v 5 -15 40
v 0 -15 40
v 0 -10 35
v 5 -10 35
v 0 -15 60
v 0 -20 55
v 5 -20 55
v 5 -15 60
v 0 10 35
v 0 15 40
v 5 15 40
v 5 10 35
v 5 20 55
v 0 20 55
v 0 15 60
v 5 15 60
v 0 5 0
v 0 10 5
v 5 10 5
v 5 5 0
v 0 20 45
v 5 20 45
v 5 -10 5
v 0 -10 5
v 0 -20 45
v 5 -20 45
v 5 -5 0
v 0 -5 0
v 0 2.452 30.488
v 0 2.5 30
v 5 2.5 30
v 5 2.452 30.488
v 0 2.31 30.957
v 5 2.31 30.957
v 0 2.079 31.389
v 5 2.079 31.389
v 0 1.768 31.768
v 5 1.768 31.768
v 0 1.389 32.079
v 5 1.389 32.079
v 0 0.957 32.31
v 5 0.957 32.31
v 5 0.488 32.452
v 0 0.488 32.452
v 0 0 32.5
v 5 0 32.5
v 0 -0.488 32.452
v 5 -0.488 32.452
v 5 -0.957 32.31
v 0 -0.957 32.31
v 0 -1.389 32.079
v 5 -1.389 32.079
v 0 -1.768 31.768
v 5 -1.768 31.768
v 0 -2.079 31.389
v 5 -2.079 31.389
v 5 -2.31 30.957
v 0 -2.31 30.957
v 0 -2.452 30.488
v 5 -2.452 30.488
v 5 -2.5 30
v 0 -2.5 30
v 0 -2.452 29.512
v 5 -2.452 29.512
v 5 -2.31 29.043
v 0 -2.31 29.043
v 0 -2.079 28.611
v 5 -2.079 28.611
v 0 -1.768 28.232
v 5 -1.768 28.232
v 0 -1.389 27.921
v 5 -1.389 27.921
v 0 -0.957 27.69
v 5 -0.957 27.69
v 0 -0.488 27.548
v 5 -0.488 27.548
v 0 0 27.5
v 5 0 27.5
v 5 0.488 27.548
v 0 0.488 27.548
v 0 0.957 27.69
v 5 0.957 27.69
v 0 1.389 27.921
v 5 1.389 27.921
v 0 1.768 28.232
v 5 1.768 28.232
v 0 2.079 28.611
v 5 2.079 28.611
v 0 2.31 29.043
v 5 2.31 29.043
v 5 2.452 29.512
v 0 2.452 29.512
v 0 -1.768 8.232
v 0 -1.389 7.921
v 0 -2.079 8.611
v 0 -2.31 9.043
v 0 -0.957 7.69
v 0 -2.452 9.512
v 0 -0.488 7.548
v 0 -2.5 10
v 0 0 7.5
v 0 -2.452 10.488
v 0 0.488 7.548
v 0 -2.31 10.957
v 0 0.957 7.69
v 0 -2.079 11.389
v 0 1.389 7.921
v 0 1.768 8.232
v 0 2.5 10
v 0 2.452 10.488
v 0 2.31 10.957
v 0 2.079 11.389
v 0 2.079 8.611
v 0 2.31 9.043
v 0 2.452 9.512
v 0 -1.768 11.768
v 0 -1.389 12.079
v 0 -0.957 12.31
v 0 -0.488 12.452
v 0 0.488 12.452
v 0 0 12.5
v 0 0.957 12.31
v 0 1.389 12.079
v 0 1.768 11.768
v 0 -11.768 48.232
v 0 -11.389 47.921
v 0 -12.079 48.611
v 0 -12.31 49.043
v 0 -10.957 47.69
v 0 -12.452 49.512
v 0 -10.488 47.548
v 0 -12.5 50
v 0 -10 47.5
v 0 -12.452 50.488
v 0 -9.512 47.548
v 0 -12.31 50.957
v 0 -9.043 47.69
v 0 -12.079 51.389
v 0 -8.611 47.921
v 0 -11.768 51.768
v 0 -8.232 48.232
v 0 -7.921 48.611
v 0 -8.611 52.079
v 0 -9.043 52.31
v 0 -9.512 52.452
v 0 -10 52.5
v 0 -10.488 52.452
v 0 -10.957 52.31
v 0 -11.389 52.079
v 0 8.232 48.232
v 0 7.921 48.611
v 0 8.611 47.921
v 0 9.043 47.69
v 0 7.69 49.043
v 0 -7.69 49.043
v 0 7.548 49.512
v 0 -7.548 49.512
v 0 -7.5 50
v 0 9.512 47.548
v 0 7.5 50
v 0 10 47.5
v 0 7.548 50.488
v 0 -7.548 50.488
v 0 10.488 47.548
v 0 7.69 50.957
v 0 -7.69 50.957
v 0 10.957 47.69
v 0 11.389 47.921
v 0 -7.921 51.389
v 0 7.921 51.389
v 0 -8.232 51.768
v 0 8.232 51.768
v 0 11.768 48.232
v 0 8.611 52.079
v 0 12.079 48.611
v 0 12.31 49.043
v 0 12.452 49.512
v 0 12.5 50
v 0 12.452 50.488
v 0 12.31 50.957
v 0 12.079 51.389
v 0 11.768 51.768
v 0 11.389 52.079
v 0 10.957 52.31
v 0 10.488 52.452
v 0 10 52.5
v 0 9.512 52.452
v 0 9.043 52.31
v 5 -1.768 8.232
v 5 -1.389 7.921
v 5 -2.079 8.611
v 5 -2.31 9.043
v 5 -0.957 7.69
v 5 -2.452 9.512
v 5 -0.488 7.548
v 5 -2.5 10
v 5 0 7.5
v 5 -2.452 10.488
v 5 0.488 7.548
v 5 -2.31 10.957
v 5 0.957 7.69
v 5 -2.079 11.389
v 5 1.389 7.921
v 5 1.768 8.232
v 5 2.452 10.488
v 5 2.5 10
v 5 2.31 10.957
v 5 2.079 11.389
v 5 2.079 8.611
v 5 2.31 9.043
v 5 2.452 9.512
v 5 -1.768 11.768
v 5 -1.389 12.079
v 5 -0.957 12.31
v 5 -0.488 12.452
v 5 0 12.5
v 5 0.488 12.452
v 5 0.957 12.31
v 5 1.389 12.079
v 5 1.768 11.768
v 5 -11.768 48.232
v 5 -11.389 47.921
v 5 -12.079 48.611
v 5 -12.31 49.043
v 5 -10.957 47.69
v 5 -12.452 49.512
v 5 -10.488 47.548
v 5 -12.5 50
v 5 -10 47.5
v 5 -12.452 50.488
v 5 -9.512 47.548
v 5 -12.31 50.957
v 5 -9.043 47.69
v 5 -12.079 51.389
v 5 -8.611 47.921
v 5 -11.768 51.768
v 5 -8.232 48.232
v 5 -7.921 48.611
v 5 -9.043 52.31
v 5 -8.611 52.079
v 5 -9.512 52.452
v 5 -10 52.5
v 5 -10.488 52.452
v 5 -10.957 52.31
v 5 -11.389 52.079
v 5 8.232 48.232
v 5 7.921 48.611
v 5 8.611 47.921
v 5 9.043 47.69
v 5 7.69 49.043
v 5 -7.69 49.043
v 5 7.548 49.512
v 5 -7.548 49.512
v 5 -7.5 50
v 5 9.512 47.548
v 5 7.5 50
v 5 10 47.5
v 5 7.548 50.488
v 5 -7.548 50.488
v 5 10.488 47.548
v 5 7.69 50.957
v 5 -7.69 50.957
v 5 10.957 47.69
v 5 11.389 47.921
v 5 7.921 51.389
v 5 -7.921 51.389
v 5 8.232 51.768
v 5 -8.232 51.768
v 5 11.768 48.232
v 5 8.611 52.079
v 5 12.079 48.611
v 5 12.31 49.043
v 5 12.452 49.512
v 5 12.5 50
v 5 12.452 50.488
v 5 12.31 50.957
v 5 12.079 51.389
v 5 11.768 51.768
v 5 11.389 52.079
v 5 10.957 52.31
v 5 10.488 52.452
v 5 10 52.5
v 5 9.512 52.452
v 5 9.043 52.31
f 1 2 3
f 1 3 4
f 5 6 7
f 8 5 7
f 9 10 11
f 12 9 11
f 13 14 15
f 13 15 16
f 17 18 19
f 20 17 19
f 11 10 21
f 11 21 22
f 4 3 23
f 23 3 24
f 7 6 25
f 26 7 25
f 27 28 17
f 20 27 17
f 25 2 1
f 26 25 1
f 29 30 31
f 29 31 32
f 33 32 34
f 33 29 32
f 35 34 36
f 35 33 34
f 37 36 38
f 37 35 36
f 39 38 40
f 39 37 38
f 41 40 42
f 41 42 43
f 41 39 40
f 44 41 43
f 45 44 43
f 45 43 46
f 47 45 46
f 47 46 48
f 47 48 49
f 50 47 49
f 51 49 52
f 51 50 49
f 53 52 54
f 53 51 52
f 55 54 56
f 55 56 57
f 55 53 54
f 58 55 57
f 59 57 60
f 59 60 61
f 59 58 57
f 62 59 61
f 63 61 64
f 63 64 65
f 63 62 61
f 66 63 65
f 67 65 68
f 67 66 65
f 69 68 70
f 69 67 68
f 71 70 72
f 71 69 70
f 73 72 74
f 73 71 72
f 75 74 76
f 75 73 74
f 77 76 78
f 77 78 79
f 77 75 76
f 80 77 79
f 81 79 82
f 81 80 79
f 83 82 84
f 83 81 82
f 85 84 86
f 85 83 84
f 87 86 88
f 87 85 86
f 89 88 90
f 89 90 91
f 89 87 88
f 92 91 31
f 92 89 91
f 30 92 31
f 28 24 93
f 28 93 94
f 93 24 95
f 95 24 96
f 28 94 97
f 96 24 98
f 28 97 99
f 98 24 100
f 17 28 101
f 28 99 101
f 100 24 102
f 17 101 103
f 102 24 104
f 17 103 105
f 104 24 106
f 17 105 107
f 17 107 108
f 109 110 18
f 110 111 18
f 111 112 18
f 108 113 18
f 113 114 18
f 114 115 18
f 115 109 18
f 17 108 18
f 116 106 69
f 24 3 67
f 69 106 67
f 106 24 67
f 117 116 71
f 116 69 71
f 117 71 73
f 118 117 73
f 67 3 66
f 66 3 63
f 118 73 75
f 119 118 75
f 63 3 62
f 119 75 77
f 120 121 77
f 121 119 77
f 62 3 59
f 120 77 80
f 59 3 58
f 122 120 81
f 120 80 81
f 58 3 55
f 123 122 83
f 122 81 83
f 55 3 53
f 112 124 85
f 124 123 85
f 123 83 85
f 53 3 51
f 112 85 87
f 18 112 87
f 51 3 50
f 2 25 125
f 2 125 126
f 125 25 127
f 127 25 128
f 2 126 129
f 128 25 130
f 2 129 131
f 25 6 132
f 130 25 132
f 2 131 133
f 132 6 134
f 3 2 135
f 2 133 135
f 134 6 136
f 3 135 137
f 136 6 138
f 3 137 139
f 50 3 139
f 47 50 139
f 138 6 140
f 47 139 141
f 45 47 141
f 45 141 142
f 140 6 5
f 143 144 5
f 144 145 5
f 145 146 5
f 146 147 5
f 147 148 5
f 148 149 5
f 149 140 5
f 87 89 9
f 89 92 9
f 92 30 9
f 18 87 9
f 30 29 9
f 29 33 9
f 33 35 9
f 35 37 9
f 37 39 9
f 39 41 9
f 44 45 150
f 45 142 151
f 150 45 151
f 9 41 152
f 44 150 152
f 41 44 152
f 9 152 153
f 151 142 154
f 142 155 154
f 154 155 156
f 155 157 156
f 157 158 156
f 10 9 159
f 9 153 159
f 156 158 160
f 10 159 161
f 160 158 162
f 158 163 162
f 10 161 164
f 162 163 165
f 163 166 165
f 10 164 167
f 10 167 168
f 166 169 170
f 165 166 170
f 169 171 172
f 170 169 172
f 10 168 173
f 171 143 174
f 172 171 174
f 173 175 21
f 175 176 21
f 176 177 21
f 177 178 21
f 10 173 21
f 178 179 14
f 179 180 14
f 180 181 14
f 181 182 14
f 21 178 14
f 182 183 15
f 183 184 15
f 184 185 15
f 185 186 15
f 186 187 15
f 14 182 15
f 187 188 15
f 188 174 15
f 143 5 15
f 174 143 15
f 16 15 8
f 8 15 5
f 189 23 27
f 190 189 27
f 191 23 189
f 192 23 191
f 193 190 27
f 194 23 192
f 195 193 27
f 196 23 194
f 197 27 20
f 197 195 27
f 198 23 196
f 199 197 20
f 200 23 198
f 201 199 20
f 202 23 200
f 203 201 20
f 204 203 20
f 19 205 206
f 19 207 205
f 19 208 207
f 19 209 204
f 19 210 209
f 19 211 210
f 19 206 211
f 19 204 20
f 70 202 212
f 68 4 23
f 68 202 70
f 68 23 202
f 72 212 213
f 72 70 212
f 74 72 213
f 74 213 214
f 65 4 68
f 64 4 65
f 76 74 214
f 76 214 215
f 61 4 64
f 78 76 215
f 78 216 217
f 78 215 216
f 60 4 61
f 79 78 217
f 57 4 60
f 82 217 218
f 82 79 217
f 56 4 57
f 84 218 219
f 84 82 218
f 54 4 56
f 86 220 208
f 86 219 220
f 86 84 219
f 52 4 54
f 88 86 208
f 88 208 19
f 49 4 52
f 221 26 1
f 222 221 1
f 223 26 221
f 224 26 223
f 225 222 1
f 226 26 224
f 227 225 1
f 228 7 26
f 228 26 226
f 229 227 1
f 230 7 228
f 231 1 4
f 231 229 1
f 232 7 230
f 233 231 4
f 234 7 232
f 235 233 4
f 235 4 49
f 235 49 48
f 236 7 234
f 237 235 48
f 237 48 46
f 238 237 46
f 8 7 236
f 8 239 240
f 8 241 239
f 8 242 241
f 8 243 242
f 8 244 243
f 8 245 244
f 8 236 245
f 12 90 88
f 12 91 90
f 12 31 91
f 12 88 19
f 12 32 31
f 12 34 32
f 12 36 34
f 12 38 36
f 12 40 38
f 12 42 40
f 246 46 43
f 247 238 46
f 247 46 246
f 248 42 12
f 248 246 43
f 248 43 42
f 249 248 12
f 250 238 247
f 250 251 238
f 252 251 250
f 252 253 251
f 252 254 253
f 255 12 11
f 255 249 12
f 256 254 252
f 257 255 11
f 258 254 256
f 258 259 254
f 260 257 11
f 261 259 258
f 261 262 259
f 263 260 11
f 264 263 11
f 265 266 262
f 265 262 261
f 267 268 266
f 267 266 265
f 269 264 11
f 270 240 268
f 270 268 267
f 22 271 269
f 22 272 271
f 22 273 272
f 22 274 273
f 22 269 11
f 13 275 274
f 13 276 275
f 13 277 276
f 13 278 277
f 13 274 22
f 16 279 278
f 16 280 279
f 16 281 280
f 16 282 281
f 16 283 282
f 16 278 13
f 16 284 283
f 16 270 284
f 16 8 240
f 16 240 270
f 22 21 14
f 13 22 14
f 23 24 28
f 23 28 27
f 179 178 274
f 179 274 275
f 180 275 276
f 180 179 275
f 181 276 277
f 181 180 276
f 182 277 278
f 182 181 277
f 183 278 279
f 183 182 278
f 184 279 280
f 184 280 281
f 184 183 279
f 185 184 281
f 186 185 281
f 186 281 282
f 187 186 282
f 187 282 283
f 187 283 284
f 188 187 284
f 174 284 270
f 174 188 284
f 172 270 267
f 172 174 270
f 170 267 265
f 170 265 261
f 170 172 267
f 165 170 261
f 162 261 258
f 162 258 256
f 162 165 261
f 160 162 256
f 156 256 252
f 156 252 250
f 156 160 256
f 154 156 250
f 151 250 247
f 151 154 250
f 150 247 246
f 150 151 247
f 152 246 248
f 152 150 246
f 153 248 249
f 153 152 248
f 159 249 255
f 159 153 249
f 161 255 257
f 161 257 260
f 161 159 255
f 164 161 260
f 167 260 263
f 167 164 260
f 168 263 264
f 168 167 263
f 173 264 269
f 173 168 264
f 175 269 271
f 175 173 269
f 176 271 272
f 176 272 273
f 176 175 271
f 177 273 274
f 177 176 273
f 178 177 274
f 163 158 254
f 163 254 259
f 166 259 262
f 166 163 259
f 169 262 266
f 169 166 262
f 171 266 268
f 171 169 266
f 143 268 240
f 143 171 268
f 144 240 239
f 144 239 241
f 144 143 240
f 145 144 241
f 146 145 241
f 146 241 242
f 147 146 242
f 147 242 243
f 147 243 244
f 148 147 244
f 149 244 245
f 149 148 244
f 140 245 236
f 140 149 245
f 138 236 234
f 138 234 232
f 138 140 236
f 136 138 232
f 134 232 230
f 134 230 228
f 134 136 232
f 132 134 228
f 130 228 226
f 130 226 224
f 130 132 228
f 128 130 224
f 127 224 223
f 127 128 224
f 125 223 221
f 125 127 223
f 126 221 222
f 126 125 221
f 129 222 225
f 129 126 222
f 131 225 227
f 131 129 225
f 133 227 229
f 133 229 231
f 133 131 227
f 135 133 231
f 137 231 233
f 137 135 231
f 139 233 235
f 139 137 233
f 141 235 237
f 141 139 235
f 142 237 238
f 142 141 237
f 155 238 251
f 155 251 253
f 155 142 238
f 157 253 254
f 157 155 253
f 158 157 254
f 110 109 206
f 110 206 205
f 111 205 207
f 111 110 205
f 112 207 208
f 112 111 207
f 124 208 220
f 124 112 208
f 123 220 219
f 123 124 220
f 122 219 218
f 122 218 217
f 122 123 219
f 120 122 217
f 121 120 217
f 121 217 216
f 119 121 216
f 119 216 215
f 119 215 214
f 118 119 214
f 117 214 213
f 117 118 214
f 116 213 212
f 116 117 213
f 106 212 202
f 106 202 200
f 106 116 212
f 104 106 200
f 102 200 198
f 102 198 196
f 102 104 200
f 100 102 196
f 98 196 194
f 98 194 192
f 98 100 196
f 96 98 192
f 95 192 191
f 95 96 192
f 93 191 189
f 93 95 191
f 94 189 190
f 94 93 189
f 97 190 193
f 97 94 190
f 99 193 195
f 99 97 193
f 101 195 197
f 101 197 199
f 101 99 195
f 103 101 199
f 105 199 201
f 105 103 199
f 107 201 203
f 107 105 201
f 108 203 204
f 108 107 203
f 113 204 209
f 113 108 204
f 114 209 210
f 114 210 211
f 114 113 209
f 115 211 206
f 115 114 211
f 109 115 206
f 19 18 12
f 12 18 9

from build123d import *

# Parameters (mm, degrees)
F0_R     = 2.5
F1_DEPTH = 5
F2_SIZE  = 4.99999


# Not quite as in the source:
# - a fillet or chamfer is up to 0.001 mm smaller than in the source, because OpenCascade refuses the exact size


with BuildPart() as f1:
    # F0 (on Right) → F1 (new body)
    with BuildSketch(Plane.YZ):
        Polygon((-10, 0), (10, 0), (10, 40), (20, 40), (20, 60), (-20, 60), (-20, 40), (-10, 40), align=None)
        with Locations((0, 10)):
            Circle(F0_R, mode=Mode.SUBTRACT)
        with Locations((-10, 50)):
            Circle(F0_R, mode=Mode.SUBTRACT)
        with Locations((0, 30)):
            Circle(F0_R, mode=Mode.SUBTRACT)
        with Locations((10, 50)):
            Circle(F0_R, mode=Mode.SUBTRACT)
    extrude(amount=F1_DEPTH)

    # F2 (size 5 in the source; OpenCascade refuses exactly that, so slightly less here)
    f2_edges = [f1.edges().sort_by_distance(p)[0] for p in [
        (2.5, 10, 40),
        (2.5, 20, 40),
        (2.5, 20, 60),
        (2.5, 10, 0),
        (2.5, -10, 0),
        (2.5, -10, 40),
        (2.5, -20, 40),
        (2.5, -20, 60),
    ]]
    chamfer(f2_edges, length=F2_SIZE)


solid = f1.part
